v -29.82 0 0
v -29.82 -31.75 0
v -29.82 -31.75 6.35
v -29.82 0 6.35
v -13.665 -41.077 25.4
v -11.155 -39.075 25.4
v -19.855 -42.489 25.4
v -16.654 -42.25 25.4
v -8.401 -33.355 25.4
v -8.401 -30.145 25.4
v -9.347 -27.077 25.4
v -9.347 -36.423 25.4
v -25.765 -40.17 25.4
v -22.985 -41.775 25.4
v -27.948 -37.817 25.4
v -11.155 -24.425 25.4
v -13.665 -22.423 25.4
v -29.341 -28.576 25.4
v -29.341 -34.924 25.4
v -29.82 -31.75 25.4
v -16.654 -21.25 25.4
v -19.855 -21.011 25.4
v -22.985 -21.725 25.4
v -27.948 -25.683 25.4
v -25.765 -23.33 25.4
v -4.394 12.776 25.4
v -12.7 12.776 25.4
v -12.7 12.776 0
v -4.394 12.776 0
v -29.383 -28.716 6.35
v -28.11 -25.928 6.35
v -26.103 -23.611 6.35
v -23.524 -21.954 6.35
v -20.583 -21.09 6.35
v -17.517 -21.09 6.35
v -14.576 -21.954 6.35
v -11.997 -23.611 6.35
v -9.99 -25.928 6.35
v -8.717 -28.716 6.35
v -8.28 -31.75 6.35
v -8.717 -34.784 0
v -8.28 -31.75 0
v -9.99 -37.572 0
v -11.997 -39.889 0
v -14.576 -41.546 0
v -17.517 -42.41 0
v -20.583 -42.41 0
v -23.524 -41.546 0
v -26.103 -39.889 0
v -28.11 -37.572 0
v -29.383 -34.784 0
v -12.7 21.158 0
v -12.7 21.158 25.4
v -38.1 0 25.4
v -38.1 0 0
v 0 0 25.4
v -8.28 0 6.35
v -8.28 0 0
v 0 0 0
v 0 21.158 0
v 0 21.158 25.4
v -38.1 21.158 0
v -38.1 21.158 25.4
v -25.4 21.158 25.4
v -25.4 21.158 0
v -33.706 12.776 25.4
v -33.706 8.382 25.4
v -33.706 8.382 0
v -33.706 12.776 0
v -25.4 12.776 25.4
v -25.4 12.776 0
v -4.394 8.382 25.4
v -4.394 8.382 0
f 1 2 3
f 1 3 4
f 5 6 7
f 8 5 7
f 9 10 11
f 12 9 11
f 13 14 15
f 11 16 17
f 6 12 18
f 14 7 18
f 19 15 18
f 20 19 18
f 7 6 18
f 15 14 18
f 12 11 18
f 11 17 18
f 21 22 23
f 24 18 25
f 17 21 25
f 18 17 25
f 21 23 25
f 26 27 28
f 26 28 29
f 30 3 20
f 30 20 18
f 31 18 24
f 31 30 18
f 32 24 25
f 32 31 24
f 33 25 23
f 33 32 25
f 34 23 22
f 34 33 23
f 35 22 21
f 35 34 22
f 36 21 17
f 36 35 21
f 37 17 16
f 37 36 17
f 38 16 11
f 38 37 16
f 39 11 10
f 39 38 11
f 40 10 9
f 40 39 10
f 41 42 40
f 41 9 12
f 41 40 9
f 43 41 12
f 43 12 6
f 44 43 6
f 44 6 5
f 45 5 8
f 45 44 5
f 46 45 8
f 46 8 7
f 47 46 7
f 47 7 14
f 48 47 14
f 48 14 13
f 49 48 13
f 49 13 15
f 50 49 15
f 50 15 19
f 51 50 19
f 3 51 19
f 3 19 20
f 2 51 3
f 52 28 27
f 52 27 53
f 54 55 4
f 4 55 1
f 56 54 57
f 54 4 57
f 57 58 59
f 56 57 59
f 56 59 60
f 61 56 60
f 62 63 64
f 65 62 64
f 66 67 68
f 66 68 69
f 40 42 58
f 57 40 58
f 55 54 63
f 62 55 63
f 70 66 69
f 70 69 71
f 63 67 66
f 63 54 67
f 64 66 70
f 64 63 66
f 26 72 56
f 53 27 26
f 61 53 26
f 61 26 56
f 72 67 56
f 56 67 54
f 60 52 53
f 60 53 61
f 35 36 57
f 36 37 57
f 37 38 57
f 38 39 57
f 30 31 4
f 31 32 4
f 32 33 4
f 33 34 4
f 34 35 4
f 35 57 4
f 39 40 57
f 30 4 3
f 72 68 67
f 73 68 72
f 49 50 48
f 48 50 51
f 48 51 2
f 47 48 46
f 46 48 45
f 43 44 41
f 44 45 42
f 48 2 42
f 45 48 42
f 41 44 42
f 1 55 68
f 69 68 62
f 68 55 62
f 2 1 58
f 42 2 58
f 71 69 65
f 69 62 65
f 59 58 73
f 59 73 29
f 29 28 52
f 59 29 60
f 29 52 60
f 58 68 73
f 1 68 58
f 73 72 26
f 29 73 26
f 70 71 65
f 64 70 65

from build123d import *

# Parameters (mm, degrees)
SKETCH1_W           = 38.1
SKETCH1_H           = 8.382
BOSS_EXTRUDE1_DEPTH = 25.4
SKETCH2_W           = 4.3942
SKETCH2_H           = 4.3942
BOSS_EXTRUDE2_DEPTH = 25.4
SKETCH3_W           = 12.7
SKETCH3_H           = 8.382
BOSS_EXTRUDE3_DEPTH = 25.4
SKETCH4_W           = 21.5392
SKETCH4_H           = 31.75
BOSS_EXTRUDE4_DEPTH = 6.35
SKETCH5_R           = 10.7696
BOSS_EXTRUDE5_DEPTH = 25.4


with BuildPart() as part:
    # Sketch1 → Boss-Extrude1 (new body)
    with BuildSketch(Plane.XY):
        with Locations((-19.05, 4.191)):
            Rectangle(SKETCH1_W, SKETCH1_H)
    extrude(amount=BOSS_EXTRUDE1_DEPTH)

    # Sketch2 → Boss-Extrude2 (add)
    with BuildSketch(Plane.XY.offset(25.4)):
        with Locations((-35.9029, 10.5791)):
            Rectangle(SKETCH2_W, SKETCH2_H)
        with Locations((-2.1971, 10.5791)):
            Rectangle(SKETCH2_W, SKETCH2_H)
    extrude(amount=-BOSS_EXTRUDE2_DEPTH)

    # Sketch3 → Boss-Extrude3 (add)
    with BuildSketch(Plane.XY.offset(25.4)):
        with Locations((-31.75, 16.9672)):
            Rectangle(SKETCH3_W, SKETCH3_H)
        with Locations((-6.35, 16.9672)):
            Rectangle(SKETCH3_W, SKETCH3_H)
    extrude(amount=-BOSS_EXTRUDE3_DEPTH)


with BuildPart() as body_2:
    # Sketch4 → Boss-Extrude4 (new body)
    with BuildSketch(Plane(origin=(0, 0, 0), x_dir=(-1, 0, 0), z_dir=(0, 0, -1))):
        with Locations((19.05, -15.875)):
            Rectangle(SKETCH4_W, SKETCH4_H)
    extrude(amount=-BOSS_EXTRUDE4_DEPTH)

    # Sketch5 → Boss-Extrude5 (add)
    with BuildSketch(Plane(origin=(0, 0, 0), x_dir=(-1, 0, 0), z_dir=(0, 0, -1))):
        with Locations((19.05, -31.75)):
            Circle(SKETCH5_R)
    extrude(amount=-BOSS_EXTRUDE5_DEPTH)

    # Combine1: union part
    add(part.part)


solid = body_2.part
